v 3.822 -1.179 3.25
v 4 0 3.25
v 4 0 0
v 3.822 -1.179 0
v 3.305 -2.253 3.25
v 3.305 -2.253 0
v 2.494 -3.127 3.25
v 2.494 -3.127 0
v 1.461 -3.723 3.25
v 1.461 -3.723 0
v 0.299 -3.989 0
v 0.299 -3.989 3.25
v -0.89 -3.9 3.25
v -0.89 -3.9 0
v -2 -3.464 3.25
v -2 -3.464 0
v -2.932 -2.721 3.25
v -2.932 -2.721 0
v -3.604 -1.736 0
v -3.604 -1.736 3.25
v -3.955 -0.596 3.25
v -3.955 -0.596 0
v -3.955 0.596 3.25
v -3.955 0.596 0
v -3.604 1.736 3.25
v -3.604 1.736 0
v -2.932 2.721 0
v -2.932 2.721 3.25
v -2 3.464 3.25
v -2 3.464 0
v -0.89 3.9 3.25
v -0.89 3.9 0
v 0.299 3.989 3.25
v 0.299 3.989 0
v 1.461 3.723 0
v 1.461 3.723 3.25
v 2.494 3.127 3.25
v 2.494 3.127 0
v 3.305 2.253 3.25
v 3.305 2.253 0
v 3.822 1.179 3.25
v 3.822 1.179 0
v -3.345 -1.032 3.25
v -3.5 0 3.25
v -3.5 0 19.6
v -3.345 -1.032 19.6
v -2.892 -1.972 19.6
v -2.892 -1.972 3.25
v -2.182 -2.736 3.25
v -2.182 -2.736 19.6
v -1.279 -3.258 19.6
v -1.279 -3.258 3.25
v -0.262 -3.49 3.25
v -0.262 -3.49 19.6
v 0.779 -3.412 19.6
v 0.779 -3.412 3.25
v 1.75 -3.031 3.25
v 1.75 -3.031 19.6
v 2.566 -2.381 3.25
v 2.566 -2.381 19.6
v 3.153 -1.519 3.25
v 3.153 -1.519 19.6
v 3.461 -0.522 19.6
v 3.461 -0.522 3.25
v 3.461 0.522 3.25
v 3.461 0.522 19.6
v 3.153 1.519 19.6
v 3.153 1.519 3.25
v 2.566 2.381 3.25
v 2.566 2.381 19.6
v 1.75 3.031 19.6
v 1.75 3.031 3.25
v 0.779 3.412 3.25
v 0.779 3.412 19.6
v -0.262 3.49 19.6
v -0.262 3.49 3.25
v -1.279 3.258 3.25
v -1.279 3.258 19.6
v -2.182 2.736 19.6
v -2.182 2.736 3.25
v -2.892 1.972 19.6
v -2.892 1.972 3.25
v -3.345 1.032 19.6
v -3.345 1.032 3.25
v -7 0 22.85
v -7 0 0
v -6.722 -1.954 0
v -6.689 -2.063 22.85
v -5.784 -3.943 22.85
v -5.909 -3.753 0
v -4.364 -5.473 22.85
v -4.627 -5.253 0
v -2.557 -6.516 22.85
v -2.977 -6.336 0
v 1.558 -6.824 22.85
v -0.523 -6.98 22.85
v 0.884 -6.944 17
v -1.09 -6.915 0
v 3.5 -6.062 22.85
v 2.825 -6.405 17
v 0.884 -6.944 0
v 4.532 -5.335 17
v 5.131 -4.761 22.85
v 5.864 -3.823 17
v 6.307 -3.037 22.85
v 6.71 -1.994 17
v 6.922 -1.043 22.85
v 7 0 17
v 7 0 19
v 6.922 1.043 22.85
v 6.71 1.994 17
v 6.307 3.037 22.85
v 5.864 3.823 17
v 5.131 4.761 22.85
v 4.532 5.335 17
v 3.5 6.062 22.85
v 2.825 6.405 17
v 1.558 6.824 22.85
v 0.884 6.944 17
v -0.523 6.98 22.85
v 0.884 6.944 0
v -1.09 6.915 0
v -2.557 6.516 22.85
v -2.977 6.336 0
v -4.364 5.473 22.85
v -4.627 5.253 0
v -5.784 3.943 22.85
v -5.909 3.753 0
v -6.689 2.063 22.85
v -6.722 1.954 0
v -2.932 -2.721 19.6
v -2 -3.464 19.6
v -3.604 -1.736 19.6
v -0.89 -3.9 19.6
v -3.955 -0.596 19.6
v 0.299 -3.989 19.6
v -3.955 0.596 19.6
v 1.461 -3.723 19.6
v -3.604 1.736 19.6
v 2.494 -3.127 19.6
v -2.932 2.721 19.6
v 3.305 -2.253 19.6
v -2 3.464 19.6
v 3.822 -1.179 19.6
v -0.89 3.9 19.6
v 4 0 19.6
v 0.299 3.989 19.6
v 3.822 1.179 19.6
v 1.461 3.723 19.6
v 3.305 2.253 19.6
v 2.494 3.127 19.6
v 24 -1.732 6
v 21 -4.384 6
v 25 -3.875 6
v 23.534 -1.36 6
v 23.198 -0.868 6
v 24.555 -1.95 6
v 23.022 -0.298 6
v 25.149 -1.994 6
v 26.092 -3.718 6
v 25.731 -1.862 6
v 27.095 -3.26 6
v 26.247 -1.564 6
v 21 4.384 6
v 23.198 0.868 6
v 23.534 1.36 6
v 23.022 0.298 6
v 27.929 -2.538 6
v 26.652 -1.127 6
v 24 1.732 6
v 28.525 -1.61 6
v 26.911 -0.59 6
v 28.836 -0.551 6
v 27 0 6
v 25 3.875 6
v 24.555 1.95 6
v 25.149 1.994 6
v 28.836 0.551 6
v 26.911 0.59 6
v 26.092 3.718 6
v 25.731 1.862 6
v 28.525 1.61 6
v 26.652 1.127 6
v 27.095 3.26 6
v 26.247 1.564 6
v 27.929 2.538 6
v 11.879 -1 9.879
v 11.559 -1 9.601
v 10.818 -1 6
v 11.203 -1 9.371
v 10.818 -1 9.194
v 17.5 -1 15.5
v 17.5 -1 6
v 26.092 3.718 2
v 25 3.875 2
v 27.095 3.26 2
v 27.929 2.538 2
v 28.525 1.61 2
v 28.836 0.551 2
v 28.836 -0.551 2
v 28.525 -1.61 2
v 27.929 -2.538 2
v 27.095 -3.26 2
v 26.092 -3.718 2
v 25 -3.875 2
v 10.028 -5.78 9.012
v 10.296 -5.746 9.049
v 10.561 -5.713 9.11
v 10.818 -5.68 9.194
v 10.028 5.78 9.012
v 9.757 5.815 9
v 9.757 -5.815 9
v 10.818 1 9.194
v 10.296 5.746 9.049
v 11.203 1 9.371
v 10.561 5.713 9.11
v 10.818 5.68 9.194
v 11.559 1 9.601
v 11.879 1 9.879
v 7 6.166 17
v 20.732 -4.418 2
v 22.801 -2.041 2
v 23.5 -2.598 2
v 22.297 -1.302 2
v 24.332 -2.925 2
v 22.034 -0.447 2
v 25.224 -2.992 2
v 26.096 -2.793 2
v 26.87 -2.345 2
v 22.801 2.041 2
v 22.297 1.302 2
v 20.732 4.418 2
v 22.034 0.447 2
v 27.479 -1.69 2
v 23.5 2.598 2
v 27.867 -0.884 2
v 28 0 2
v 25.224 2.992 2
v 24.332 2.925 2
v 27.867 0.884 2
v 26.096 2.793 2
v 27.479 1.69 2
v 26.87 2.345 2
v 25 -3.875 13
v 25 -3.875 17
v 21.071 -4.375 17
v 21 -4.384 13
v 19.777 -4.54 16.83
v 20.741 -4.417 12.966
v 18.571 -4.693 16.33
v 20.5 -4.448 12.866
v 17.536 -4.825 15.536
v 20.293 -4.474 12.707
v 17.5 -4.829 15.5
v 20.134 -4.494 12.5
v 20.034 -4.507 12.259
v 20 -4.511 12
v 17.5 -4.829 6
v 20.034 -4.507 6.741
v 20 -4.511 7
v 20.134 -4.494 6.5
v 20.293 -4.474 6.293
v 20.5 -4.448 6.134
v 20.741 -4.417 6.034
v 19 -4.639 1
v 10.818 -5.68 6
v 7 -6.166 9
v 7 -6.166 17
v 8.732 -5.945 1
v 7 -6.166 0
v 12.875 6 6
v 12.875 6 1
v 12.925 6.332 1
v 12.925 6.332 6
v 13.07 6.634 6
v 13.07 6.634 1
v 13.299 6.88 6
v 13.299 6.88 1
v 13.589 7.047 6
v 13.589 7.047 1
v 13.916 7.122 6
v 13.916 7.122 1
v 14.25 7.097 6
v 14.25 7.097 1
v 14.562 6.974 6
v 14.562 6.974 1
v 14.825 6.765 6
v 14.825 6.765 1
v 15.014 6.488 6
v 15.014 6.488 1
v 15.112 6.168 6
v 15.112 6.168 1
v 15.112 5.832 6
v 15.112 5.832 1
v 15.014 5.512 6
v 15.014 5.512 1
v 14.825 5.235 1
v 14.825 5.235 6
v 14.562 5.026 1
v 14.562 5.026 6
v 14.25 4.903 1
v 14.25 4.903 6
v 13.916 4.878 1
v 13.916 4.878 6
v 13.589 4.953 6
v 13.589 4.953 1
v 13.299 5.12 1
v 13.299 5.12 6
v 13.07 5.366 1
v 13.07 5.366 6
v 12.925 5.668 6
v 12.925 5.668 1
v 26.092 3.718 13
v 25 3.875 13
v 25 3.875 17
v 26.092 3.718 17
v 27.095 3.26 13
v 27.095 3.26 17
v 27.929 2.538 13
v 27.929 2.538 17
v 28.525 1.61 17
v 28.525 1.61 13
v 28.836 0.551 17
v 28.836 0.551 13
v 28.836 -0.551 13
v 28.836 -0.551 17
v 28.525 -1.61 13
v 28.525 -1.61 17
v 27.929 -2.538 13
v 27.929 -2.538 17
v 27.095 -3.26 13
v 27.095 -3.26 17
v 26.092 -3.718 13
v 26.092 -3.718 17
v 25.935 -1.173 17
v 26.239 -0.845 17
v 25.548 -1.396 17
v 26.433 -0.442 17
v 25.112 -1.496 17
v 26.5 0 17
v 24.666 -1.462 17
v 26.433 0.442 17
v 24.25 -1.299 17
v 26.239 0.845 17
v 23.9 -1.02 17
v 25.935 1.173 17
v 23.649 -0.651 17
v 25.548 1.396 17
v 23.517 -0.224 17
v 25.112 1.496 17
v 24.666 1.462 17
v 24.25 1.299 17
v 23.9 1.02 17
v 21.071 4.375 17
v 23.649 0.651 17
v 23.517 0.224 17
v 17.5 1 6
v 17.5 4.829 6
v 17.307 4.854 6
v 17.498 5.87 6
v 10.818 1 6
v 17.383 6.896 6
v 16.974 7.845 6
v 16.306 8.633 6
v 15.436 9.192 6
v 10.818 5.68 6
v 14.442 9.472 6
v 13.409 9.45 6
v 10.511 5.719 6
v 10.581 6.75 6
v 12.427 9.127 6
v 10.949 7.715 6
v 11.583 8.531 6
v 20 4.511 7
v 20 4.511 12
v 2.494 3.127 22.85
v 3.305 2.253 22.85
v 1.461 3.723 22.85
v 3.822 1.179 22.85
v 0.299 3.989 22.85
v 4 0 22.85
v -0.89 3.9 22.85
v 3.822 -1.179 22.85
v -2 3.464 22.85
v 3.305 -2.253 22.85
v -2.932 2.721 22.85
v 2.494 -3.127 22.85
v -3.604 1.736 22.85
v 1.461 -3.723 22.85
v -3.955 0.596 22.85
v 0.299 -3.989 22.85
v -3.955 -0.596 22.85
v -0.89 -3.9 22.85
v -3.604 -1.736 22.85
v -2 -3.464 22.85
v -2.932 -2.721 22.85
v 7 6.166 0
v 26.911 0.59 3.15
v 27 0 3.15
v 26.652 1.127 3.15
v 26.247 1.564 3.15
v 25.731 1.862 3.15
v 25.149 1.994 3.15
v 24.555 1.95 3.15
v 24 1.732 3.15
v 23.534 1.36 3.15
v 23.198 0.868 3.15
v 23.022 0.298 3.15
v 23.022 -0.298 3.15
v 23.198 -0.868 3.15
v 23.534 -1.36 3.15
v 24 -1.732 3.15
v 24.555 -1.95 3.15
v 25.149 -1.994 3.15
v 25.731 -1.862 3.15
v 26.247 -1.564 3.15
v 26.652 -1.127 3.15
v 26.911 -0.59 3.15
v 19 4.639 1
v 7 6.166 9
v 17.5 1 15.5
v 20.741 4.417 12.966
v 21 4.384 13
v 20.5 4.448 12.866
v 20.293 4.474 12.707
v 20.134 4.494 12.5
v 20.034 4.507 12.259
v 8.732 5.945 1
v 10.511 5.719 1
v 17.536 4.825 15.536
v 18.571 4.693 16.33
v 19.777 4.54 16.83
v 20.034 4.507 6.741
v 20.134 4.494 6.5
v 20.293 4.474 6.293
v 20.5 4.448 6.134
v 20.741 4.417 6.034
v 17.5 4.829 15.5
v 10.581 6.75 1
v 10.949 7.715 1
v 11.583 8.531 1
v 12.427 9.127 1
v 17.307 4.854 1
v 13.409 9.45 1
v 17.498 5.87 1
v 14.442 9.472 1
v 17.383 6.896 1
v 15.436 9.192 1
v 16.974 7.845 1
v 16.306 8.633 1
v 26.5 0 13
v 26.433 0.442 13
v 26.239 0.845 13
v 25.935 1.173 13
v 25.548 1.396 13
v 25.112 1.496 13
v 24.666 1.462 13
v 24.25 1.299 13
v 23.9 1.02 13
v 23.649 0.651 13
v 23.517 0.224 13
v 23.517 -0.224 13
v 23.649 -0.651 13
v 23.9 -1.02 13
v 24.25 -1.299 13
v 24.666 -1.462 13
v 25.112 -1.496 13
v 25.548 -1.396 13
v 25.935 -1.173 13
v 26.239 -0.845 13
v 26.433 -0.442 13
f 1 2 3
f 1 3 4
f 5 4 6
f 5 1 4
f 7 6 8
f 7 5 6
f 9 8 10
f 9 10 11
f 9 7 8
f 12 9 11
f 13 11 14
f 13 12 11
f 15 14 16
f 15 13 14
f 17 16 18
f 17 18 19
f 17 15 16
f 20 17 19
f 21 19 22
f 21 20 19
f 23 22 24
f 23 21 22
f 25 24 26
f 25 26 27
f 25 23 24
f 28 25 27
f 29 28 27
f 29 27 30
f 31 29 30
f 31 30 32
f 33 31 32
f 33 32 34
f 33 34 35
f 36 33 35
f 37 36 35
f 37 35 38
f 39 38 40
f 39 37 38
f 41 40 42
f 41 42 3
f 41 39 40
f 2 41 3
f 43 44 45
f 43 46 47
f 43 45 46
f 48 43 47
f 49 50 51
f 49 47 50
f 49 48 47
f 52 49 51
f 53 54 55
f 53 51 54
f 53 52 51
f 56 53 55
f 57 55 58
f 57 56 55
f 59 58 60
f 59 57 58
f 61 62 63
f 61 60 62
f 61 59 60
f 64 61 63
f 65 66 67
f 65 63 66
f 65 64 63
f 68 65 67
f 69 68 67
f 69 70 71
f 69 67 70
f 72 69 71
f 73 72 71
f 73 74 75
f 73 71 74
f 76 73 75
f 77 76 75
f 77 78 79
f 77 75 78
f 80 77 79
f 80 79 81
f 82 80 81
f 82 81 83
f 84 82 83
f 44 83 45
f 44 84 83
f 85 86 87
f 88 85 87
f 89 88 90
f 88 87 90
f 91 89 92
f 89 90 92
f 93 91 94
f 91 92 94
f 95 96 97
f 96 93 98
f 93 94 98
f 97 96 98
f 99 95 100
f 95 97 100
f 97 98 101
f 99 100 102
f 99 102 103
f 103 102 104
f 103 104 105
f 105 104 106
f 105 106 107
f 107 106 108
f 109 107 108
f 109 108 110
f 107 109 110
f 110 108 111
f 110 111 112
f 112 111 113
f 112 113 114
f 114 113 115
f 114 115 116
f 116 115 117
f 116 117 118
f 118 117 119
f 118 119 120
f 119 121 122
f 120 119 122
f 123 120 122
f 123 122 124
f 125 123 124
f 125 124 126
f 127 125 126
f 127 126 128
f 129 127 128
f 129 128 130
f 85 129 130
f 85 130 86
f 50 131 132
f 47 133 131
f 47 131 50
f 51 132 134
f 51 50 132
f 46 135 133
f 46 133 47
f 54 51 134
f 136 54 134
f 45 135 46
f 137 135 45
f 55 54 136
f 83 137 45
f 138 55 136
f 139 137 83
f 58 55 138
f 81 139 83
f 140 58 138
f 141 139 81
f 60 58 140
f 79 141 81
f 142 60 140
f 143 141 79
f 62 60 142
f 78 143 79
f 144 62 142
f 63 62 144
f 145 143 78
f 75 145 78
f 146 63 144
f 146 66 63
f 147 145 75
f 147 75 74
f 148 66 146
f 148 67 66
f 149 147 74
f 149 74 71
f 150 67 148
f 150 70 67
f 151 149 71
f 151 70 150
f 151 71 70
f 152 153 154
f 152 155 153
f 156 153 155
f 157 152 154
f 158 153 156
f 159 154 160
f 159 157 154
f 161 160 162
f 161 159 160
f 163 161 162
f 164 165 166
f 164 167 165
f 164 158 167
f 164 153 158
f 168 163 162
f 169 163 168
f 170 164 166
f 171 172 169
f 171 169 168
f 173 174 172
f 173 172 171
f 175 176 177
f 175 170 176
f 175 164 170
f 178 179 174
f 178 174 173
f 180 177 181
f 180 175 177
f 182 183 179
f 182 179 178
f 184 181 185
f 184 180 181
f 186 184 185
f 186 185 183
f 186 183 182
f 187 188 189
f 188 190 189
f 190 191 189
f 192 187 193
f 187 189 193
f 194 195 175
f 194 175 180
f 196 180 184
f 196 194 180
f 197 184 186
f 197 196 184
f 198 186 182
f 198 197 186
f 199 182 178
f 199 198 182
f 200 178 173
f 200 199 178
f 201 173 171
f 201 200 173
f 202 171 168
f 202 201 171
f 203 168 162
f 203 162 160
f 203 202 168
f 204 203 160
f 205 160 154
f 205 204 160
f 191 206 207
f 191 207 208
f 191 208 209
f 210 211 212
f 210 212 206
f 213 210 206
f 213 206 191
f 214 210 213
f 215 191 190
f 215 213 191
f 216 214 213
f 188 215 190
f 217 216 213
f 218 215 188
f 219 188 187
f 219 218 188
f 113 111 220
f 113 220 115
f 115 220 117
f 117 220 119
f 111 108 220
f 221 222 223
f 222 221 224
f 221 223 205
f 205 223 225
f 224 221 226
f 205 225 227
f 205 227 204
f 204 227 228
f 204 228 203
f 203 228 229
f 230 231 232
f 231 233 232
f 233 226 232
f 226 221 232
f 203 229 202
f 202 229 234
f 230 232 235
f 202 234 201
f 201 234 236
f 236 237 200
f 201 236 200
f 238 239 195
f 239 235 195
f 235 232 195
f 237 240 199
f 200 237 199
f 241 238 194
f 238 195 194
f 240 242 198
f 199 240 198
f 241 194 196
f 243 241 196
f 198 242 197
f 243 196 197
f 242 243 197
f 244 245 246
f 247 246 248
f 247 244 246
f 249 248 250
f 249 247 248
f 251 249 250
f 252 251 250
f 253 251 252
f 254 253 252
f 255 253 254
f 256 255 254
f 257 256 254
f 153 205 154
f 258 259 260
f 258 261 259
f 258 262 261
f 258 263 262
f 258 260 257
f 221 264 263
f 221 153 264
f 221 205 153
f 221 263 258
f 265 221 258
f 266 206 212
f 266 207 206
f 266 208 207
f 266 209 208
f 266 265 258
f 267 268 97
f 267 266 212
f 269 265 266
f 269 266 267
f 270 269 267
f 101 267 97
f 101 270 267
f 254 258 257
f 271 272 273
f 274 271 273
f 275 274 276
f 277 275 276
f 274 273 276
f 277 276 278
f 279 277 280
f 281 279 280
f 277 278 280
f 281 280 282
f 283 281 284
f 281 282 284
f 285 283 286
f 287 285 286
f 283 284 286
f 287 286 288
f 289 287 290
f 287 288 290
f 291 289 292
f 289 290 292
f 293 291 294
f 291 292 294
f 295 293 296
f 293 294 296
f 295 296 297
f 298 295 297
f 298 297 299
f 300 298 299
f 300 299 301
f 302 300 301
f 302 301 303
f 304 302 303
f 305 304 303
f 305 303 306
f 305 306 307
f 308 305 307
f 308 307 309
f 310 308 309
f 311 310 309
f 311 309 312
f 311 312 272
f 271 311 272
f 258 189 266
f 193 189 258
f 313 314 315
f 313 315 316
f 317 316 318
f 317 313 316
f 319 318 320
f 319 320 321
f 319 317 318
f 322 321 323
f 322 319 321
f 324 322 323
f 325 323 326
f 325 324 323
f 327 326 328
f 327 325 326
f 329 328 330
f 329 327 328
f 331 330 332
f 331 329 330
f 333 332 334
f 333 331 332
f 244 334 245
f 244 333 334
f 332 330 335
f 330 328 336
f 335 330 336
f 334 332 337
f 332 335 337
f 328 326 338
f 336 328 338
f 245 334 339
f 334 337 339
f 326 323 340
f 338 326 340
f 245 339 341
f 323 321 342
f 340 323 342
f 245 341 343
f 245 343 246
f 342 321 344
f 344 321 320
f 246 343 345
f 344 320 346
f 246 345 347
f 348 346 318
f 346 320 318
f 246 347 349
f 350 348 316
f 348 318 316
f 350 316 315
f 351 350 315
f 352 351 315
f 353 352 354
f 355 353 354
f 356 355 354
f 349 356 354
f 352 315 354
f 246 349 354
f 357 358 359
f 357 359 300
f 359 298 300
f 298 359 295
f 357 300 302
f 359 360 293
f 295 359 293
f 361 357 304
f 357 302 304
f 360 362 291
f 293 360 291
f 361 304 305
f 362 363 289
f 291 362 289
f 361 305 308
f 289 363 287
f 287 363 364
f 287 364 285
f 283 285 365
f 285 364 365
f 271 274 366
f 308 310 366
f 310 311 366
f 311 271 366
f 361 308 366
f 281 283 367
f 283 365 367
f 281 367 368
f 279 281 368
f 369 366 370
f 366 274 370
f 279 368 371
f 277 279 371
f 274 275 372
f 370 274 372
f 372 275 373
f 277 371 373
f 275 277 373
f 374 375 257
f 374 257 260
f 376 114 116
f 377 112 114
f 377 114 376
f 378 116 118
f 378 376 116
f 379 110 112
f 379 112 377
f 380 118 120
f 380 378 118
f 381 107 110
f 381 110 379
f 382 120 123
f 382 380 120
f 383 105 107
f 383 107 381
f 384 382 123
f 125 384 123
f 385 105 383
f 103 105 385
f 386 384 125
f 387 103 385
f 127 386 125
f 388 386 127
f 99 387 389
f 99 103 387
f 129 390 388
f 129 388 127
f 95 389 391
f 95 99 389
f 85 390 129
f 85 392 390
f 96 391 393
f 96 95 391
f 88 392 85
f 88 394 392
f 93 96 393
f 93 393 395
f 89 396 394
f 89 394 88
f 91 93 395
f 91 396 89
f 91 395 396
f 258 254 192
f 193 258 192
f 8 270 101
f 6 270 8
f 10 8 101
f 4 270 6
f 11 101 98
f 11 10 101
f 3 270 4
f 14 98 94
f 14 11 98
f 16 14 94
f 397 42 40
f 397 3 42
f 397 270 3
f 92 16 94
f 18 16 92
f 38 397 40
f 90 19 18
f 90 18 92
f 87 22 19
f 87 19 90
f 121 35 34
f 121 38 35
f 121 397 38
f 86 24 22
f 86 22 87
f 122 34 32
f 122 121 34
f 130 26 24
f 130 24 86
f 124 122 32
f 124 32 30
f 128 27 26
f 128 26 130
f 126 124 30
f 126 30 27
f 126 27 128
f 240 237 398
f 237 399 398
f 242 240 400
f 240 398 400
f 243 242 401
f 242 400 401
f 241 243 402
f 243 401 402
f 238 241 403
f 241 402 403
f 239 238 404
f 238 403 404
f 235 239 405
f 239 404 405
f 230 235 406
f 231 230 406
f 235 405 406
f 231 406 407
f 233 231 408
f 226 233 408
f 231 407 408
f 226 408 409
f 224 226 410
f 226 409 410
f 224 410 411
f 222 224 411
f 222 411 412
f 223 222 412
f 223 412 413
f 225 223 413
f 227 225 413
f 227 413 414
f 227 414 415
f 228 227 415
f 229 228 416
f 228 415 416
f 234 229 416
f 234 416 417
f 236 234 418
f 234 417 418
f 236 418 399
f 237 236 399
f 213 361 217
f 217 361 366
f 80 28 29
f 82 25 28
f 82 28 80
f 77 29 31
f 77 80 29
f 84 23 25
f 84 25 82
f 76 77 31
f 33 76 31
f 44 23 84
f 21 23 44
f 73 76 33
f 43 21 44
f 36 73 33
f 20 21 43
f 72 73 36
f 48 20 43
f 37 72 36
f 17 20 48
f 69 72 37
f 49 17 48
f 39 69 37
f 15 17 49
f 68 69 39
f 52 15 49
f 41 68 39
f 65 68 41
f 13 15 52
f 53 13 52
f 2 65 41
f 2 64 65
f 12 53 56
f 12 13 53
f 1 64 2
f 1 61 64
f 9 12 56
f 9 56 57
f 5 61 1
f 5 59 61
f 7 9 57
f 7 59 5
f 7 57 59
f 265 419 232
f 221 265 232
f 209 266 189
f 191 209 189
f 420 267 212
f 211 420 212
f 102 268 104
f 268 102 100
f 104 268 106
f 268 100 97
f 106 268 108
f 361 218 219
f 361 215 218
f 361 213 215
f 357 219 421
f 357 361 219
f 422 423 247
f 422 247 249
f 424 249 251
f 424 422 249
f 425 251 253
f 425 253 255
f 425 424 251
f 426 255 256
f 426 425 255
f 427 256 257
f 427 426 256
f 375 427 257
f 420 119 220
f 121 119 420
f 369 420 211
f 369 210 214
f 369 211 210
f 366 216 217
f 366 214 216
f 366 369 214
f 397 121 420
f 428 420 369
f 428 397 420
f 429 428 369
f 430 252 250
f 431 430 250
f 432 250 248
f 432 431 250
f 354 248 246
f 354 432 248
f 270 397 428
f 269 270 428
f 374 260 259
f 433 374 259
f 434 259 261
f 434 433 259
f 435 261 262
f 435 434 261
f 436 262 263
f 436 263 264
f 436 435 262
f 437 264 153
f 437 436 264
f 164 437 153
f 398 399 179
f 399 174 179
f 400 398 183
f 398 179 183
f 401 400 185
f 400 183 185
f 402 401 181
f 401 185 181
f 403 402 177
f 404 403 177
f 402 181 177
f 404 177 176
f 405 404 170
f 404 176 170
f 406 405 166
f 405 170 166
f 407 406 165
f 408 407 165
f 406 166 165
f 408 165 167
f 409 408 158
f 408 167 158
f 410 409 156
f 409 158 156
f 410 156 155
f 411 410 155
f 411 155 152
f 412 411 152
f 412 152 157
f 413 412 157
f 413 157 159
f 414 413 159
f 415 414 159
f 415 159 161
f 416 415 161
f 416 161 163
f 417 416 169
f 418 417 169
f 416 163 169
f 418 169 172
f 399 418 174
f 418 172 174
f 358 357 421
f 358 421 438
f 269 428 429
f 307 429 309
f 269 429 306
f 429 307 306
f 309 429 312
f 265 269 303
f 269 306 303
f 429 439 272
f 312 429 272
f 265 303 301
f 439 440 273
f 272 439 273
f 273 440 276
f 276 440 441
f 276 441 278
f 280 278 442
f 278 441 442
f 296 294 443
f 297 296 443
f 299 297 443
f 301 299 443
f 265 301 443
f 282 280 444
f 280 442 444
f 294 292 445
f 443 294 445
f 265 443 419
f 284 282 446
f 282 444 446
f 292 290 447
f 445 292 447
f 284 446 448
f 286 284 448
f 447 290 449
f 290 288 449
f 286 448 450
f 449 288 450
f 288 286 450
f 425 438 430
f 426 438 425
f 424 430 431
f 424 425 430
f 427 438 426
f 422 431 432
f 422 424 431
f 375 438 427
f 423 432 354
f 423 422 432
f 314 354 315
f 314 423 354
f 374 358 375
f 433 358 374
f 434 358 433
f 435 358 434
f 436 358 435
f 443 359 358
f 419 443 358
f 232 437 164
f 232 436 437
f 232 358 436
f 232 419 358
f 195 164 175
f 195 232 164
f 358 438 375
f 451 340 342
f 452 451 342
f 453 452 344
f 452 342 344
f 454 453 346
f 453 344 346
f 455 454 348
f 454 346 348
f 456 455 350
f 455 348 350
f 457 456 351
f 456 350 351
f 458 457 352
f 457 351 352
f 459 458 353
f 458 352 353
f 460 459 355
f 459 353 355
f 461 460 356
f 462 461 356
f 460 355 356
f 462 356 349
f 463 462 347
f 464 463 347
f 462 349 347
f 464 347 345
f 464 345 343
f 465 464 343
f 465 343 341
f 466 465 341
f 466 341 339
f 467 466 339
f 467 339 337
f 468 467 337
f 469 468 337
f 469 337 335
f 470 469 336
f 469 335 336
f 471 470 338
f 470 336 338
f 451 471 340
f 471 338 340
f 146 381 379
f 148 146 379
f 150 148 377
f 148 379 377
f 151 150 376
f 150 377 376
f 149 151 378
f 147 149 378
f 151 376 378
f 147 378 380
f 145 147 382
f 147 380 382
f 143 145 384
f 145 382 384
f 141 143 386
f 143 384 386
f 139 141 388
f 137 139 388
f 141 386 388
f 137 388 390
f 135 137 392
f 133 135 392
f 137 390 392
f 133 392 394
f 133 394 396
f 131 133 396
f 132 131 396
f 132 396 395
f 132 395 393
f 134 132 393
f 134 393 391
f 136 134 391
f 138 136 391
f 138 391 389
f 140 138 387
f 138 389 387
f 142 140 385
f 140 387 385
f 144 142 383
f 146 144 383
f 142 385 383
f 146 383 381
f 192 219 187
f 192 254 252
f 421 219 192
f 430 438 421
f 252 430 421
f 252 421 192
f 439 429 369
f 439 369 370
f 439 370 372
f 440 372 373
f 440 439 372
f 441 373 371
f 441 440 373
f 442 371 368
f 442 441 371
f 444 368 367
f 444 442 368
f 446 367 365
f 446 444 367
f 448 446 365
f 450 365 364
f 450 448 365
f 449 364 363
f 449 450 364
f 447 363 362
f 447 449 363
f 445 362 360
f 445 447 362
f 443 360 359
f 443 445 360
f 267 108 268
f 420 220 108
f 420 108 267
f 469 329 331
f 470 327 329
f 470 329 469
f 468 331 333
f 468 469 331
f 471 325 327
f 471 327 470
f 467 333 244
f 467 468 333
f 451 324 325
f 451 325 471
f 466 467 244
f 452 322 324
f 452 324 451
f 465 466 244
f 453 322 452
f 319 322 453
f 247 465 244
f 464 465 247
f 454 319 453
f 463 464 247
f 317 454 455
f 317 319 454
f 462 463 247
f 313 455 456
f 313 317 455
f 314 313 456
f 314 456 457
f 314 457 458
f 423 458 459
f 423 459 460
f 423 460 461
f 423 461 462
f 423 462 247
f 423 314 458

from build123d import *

# Parameters (mm, degrees)
SKETCH1_R                = 7
SKETCH1_R_2              = 3.5
CYLINDER_DEPTH           = 22.85
SKETCH2_R                = 4
BORE_1_DEPTH             = 3.25
BORE_START               = -3.25
SKETCH3_R                = 4
BORE_2_DEPTH             = 3.25
ARM_DEPTH                = 17
SKETCH5_R                = 3.5
OUTER_HOLE_SURFACE_DEPTH = 6
SKETCH6_R                = 1.125
OUTER_HOLE_DEPTH         = 6
SIDE_FEATURES_DEPTH      = 22
RIB_START                = -11
SKETCH10_W               = 6.681980515
SKETCH10_H               = 4.679772507
RIB_DEPTH                = 9.5
SKETCH13_R               = 1.5
BOTTOM_HOLE_DEPTH        = 4


# Read off the part's stored shape, not the designer's step: Top Counter-sunk
with BuildPart() as part:
    # Sketch1 → Cylinder (new body)
    with BuildSketch(Plane.XY):
        with Locations(Location((0, 0, 0), (0, 0, 180))):
            Circle(SKETCH1_R)
        with Locations(Location((0, 0, 0), (0, 0, 180))):
            Circle(SKETCH1_R_2, mode=Mode.SUBTRACT)
    extrude(amount=CYLINDER_DEPTH)

    # Sketch2 → Bore 1 (cut)
    with BuildSketch(Plane.XY.offset(22.85)):
        Circle(SKETCH2_R)
    extrude(amount=-BORE_1_DEPTH, mode=Mode.SUBTRACT)

    # Sketch3 → Bore 2 (cut)
    with BuildSketch(Plane(origin=(0, 0, 0), x_dir=(-1, 0, 0), z_dir=(0, 0, -1)).offset(BORE_START)):
        with Locations(Location((0, 0, 0), (0, 0, 180))):
            Circle(SKETCH3_R)
    extrude(amount=BORE_2_DEPTH, mode=Mode.SUBTRACT)

    # Sketch4 → Arm (add)
    with BuildSketch(Plane.XY):
        with BuildLine():
            Line((0.8836803, 6.943998065), (25, 3.875))
            ThreePointArc((25, 3.875), (28.875, 0), (25, -3.875))
            Line((25, -3.875), (0.8836803, -6.943998065))
            ThreePointArc((0.8836803, -6.943998065), (7, 0), (0.8836803, 6.943998065))
        make_face()
    extrude(amount=ARM_DEPTH)

    # Sketch5 → Outer Hole surface (add)
    with BuildSketch(Plane(origin=(0, 0, 0), x_dir=(-1, 0, 0), z_dir=(0, 0, -1))):
        with Locations((-14, 6)):
            Circle(SKETCH5_R)
    extrude(amount=-OUTER_HOLE_SURFACE_DEPTH)

    # Sketch6 → Outer hole (cut)
    with BuildSketch(Plane(origin=(0, 0, 0), x_dir=(-1, 0, 0), z_dir=(0, 0, -1))):
        with Locations((-14, 6)):
            Circle(SKETCH6_R)
    extrude(amount=-OUTER_HOLE_DEPTH, mode=Mode.SUBTRACT)

    # Sketch8 → side Features (cut)
    with BuildSketch(Plane(origin=(0, 10, 0), x_dir=(1, 0, 0), z_dir=(0, 1, 0))):
        with BuildLine():
            Line((21, -6), (40, -6))
            Line((40, -6), (40, -13))
            Line((40, -13), (21, -13))
            ThreePointArc((21, -13), (20.292893219, -12.707106781), (20, -12))
            Line((20, -12), (20, -7))
            ThreePointArc((20, -7), (20.292893219, -6.292893219), (21, -6))
        make_face()
        with BuildLine():
            Line((7, -19), (7, -9))
            Line((7, -9), (9.757359313, -9))
            ThreePointArc((9.757359313, -9), (10.90540961, -9.228361402), (11.878679656, -9.878679656))
            Line((11.878679656, -9.878679656), (17.535533906, -15.535533906))
            ThreePointArc((17.535533906, -15.535533906), (19.15765065, -16.619397663), (21.071067812, -17))
            Line((21.071067812, -17), (27, -17))
            Line((27, -17), (27, -19))
            Line((27, -19), (7, -19))
        make_face()
        Polygon((7, 0), (8.732050808, -1), (19, -1), (20.732050808, -2), (40, -2), (40, 0), align=None)
    extrude(amount=-SIDE_FEATURES_DEPTH, mode=Mode.SUBTRACT)

    # Sketch10 → Rib (cut)
    with BuildSketch(Plane.XY.offset(17).offset(RIB_START)):
        with Locations((14.159009743, 3.339886254)):
            Rectangle(SKETCH10_W, SKETCH10_H)
        with Locations((14.159009743, -3.339886254)):
            Rectangle(SKETCH10_W, SKETCH10_H)
    extrude(amount=RIB_DEPTH, mode=Mode.SUBTRACT)

    # Top Counter-sunk outline → Top Counter-sunk (revolve, cut)
    with BuildSketch(Plane(origin=(25, 0, 0), x_dir=(1, 0, 0), z_dir=(0, -1, 0))):
        Polygon((2, 3.150368407), (2, 6), (0, 6), (0, 2), (3, 2), align=None)
    revolve(axis=Axis((25, 0, 0), (0, 0, 1)), mode=Mode.SUBTRACT)

    # Sketch13 → Bottom hole (cut)
    with BuildSketch(Plane.XY.offset(17)):
        with Locations((25, 0)):
            Circle(SKETCH13_R)
    extrude(amount=-BOTTOM_HOLE_DEPTH, mode=Mode.SUBTRACT)


solid = part.part
